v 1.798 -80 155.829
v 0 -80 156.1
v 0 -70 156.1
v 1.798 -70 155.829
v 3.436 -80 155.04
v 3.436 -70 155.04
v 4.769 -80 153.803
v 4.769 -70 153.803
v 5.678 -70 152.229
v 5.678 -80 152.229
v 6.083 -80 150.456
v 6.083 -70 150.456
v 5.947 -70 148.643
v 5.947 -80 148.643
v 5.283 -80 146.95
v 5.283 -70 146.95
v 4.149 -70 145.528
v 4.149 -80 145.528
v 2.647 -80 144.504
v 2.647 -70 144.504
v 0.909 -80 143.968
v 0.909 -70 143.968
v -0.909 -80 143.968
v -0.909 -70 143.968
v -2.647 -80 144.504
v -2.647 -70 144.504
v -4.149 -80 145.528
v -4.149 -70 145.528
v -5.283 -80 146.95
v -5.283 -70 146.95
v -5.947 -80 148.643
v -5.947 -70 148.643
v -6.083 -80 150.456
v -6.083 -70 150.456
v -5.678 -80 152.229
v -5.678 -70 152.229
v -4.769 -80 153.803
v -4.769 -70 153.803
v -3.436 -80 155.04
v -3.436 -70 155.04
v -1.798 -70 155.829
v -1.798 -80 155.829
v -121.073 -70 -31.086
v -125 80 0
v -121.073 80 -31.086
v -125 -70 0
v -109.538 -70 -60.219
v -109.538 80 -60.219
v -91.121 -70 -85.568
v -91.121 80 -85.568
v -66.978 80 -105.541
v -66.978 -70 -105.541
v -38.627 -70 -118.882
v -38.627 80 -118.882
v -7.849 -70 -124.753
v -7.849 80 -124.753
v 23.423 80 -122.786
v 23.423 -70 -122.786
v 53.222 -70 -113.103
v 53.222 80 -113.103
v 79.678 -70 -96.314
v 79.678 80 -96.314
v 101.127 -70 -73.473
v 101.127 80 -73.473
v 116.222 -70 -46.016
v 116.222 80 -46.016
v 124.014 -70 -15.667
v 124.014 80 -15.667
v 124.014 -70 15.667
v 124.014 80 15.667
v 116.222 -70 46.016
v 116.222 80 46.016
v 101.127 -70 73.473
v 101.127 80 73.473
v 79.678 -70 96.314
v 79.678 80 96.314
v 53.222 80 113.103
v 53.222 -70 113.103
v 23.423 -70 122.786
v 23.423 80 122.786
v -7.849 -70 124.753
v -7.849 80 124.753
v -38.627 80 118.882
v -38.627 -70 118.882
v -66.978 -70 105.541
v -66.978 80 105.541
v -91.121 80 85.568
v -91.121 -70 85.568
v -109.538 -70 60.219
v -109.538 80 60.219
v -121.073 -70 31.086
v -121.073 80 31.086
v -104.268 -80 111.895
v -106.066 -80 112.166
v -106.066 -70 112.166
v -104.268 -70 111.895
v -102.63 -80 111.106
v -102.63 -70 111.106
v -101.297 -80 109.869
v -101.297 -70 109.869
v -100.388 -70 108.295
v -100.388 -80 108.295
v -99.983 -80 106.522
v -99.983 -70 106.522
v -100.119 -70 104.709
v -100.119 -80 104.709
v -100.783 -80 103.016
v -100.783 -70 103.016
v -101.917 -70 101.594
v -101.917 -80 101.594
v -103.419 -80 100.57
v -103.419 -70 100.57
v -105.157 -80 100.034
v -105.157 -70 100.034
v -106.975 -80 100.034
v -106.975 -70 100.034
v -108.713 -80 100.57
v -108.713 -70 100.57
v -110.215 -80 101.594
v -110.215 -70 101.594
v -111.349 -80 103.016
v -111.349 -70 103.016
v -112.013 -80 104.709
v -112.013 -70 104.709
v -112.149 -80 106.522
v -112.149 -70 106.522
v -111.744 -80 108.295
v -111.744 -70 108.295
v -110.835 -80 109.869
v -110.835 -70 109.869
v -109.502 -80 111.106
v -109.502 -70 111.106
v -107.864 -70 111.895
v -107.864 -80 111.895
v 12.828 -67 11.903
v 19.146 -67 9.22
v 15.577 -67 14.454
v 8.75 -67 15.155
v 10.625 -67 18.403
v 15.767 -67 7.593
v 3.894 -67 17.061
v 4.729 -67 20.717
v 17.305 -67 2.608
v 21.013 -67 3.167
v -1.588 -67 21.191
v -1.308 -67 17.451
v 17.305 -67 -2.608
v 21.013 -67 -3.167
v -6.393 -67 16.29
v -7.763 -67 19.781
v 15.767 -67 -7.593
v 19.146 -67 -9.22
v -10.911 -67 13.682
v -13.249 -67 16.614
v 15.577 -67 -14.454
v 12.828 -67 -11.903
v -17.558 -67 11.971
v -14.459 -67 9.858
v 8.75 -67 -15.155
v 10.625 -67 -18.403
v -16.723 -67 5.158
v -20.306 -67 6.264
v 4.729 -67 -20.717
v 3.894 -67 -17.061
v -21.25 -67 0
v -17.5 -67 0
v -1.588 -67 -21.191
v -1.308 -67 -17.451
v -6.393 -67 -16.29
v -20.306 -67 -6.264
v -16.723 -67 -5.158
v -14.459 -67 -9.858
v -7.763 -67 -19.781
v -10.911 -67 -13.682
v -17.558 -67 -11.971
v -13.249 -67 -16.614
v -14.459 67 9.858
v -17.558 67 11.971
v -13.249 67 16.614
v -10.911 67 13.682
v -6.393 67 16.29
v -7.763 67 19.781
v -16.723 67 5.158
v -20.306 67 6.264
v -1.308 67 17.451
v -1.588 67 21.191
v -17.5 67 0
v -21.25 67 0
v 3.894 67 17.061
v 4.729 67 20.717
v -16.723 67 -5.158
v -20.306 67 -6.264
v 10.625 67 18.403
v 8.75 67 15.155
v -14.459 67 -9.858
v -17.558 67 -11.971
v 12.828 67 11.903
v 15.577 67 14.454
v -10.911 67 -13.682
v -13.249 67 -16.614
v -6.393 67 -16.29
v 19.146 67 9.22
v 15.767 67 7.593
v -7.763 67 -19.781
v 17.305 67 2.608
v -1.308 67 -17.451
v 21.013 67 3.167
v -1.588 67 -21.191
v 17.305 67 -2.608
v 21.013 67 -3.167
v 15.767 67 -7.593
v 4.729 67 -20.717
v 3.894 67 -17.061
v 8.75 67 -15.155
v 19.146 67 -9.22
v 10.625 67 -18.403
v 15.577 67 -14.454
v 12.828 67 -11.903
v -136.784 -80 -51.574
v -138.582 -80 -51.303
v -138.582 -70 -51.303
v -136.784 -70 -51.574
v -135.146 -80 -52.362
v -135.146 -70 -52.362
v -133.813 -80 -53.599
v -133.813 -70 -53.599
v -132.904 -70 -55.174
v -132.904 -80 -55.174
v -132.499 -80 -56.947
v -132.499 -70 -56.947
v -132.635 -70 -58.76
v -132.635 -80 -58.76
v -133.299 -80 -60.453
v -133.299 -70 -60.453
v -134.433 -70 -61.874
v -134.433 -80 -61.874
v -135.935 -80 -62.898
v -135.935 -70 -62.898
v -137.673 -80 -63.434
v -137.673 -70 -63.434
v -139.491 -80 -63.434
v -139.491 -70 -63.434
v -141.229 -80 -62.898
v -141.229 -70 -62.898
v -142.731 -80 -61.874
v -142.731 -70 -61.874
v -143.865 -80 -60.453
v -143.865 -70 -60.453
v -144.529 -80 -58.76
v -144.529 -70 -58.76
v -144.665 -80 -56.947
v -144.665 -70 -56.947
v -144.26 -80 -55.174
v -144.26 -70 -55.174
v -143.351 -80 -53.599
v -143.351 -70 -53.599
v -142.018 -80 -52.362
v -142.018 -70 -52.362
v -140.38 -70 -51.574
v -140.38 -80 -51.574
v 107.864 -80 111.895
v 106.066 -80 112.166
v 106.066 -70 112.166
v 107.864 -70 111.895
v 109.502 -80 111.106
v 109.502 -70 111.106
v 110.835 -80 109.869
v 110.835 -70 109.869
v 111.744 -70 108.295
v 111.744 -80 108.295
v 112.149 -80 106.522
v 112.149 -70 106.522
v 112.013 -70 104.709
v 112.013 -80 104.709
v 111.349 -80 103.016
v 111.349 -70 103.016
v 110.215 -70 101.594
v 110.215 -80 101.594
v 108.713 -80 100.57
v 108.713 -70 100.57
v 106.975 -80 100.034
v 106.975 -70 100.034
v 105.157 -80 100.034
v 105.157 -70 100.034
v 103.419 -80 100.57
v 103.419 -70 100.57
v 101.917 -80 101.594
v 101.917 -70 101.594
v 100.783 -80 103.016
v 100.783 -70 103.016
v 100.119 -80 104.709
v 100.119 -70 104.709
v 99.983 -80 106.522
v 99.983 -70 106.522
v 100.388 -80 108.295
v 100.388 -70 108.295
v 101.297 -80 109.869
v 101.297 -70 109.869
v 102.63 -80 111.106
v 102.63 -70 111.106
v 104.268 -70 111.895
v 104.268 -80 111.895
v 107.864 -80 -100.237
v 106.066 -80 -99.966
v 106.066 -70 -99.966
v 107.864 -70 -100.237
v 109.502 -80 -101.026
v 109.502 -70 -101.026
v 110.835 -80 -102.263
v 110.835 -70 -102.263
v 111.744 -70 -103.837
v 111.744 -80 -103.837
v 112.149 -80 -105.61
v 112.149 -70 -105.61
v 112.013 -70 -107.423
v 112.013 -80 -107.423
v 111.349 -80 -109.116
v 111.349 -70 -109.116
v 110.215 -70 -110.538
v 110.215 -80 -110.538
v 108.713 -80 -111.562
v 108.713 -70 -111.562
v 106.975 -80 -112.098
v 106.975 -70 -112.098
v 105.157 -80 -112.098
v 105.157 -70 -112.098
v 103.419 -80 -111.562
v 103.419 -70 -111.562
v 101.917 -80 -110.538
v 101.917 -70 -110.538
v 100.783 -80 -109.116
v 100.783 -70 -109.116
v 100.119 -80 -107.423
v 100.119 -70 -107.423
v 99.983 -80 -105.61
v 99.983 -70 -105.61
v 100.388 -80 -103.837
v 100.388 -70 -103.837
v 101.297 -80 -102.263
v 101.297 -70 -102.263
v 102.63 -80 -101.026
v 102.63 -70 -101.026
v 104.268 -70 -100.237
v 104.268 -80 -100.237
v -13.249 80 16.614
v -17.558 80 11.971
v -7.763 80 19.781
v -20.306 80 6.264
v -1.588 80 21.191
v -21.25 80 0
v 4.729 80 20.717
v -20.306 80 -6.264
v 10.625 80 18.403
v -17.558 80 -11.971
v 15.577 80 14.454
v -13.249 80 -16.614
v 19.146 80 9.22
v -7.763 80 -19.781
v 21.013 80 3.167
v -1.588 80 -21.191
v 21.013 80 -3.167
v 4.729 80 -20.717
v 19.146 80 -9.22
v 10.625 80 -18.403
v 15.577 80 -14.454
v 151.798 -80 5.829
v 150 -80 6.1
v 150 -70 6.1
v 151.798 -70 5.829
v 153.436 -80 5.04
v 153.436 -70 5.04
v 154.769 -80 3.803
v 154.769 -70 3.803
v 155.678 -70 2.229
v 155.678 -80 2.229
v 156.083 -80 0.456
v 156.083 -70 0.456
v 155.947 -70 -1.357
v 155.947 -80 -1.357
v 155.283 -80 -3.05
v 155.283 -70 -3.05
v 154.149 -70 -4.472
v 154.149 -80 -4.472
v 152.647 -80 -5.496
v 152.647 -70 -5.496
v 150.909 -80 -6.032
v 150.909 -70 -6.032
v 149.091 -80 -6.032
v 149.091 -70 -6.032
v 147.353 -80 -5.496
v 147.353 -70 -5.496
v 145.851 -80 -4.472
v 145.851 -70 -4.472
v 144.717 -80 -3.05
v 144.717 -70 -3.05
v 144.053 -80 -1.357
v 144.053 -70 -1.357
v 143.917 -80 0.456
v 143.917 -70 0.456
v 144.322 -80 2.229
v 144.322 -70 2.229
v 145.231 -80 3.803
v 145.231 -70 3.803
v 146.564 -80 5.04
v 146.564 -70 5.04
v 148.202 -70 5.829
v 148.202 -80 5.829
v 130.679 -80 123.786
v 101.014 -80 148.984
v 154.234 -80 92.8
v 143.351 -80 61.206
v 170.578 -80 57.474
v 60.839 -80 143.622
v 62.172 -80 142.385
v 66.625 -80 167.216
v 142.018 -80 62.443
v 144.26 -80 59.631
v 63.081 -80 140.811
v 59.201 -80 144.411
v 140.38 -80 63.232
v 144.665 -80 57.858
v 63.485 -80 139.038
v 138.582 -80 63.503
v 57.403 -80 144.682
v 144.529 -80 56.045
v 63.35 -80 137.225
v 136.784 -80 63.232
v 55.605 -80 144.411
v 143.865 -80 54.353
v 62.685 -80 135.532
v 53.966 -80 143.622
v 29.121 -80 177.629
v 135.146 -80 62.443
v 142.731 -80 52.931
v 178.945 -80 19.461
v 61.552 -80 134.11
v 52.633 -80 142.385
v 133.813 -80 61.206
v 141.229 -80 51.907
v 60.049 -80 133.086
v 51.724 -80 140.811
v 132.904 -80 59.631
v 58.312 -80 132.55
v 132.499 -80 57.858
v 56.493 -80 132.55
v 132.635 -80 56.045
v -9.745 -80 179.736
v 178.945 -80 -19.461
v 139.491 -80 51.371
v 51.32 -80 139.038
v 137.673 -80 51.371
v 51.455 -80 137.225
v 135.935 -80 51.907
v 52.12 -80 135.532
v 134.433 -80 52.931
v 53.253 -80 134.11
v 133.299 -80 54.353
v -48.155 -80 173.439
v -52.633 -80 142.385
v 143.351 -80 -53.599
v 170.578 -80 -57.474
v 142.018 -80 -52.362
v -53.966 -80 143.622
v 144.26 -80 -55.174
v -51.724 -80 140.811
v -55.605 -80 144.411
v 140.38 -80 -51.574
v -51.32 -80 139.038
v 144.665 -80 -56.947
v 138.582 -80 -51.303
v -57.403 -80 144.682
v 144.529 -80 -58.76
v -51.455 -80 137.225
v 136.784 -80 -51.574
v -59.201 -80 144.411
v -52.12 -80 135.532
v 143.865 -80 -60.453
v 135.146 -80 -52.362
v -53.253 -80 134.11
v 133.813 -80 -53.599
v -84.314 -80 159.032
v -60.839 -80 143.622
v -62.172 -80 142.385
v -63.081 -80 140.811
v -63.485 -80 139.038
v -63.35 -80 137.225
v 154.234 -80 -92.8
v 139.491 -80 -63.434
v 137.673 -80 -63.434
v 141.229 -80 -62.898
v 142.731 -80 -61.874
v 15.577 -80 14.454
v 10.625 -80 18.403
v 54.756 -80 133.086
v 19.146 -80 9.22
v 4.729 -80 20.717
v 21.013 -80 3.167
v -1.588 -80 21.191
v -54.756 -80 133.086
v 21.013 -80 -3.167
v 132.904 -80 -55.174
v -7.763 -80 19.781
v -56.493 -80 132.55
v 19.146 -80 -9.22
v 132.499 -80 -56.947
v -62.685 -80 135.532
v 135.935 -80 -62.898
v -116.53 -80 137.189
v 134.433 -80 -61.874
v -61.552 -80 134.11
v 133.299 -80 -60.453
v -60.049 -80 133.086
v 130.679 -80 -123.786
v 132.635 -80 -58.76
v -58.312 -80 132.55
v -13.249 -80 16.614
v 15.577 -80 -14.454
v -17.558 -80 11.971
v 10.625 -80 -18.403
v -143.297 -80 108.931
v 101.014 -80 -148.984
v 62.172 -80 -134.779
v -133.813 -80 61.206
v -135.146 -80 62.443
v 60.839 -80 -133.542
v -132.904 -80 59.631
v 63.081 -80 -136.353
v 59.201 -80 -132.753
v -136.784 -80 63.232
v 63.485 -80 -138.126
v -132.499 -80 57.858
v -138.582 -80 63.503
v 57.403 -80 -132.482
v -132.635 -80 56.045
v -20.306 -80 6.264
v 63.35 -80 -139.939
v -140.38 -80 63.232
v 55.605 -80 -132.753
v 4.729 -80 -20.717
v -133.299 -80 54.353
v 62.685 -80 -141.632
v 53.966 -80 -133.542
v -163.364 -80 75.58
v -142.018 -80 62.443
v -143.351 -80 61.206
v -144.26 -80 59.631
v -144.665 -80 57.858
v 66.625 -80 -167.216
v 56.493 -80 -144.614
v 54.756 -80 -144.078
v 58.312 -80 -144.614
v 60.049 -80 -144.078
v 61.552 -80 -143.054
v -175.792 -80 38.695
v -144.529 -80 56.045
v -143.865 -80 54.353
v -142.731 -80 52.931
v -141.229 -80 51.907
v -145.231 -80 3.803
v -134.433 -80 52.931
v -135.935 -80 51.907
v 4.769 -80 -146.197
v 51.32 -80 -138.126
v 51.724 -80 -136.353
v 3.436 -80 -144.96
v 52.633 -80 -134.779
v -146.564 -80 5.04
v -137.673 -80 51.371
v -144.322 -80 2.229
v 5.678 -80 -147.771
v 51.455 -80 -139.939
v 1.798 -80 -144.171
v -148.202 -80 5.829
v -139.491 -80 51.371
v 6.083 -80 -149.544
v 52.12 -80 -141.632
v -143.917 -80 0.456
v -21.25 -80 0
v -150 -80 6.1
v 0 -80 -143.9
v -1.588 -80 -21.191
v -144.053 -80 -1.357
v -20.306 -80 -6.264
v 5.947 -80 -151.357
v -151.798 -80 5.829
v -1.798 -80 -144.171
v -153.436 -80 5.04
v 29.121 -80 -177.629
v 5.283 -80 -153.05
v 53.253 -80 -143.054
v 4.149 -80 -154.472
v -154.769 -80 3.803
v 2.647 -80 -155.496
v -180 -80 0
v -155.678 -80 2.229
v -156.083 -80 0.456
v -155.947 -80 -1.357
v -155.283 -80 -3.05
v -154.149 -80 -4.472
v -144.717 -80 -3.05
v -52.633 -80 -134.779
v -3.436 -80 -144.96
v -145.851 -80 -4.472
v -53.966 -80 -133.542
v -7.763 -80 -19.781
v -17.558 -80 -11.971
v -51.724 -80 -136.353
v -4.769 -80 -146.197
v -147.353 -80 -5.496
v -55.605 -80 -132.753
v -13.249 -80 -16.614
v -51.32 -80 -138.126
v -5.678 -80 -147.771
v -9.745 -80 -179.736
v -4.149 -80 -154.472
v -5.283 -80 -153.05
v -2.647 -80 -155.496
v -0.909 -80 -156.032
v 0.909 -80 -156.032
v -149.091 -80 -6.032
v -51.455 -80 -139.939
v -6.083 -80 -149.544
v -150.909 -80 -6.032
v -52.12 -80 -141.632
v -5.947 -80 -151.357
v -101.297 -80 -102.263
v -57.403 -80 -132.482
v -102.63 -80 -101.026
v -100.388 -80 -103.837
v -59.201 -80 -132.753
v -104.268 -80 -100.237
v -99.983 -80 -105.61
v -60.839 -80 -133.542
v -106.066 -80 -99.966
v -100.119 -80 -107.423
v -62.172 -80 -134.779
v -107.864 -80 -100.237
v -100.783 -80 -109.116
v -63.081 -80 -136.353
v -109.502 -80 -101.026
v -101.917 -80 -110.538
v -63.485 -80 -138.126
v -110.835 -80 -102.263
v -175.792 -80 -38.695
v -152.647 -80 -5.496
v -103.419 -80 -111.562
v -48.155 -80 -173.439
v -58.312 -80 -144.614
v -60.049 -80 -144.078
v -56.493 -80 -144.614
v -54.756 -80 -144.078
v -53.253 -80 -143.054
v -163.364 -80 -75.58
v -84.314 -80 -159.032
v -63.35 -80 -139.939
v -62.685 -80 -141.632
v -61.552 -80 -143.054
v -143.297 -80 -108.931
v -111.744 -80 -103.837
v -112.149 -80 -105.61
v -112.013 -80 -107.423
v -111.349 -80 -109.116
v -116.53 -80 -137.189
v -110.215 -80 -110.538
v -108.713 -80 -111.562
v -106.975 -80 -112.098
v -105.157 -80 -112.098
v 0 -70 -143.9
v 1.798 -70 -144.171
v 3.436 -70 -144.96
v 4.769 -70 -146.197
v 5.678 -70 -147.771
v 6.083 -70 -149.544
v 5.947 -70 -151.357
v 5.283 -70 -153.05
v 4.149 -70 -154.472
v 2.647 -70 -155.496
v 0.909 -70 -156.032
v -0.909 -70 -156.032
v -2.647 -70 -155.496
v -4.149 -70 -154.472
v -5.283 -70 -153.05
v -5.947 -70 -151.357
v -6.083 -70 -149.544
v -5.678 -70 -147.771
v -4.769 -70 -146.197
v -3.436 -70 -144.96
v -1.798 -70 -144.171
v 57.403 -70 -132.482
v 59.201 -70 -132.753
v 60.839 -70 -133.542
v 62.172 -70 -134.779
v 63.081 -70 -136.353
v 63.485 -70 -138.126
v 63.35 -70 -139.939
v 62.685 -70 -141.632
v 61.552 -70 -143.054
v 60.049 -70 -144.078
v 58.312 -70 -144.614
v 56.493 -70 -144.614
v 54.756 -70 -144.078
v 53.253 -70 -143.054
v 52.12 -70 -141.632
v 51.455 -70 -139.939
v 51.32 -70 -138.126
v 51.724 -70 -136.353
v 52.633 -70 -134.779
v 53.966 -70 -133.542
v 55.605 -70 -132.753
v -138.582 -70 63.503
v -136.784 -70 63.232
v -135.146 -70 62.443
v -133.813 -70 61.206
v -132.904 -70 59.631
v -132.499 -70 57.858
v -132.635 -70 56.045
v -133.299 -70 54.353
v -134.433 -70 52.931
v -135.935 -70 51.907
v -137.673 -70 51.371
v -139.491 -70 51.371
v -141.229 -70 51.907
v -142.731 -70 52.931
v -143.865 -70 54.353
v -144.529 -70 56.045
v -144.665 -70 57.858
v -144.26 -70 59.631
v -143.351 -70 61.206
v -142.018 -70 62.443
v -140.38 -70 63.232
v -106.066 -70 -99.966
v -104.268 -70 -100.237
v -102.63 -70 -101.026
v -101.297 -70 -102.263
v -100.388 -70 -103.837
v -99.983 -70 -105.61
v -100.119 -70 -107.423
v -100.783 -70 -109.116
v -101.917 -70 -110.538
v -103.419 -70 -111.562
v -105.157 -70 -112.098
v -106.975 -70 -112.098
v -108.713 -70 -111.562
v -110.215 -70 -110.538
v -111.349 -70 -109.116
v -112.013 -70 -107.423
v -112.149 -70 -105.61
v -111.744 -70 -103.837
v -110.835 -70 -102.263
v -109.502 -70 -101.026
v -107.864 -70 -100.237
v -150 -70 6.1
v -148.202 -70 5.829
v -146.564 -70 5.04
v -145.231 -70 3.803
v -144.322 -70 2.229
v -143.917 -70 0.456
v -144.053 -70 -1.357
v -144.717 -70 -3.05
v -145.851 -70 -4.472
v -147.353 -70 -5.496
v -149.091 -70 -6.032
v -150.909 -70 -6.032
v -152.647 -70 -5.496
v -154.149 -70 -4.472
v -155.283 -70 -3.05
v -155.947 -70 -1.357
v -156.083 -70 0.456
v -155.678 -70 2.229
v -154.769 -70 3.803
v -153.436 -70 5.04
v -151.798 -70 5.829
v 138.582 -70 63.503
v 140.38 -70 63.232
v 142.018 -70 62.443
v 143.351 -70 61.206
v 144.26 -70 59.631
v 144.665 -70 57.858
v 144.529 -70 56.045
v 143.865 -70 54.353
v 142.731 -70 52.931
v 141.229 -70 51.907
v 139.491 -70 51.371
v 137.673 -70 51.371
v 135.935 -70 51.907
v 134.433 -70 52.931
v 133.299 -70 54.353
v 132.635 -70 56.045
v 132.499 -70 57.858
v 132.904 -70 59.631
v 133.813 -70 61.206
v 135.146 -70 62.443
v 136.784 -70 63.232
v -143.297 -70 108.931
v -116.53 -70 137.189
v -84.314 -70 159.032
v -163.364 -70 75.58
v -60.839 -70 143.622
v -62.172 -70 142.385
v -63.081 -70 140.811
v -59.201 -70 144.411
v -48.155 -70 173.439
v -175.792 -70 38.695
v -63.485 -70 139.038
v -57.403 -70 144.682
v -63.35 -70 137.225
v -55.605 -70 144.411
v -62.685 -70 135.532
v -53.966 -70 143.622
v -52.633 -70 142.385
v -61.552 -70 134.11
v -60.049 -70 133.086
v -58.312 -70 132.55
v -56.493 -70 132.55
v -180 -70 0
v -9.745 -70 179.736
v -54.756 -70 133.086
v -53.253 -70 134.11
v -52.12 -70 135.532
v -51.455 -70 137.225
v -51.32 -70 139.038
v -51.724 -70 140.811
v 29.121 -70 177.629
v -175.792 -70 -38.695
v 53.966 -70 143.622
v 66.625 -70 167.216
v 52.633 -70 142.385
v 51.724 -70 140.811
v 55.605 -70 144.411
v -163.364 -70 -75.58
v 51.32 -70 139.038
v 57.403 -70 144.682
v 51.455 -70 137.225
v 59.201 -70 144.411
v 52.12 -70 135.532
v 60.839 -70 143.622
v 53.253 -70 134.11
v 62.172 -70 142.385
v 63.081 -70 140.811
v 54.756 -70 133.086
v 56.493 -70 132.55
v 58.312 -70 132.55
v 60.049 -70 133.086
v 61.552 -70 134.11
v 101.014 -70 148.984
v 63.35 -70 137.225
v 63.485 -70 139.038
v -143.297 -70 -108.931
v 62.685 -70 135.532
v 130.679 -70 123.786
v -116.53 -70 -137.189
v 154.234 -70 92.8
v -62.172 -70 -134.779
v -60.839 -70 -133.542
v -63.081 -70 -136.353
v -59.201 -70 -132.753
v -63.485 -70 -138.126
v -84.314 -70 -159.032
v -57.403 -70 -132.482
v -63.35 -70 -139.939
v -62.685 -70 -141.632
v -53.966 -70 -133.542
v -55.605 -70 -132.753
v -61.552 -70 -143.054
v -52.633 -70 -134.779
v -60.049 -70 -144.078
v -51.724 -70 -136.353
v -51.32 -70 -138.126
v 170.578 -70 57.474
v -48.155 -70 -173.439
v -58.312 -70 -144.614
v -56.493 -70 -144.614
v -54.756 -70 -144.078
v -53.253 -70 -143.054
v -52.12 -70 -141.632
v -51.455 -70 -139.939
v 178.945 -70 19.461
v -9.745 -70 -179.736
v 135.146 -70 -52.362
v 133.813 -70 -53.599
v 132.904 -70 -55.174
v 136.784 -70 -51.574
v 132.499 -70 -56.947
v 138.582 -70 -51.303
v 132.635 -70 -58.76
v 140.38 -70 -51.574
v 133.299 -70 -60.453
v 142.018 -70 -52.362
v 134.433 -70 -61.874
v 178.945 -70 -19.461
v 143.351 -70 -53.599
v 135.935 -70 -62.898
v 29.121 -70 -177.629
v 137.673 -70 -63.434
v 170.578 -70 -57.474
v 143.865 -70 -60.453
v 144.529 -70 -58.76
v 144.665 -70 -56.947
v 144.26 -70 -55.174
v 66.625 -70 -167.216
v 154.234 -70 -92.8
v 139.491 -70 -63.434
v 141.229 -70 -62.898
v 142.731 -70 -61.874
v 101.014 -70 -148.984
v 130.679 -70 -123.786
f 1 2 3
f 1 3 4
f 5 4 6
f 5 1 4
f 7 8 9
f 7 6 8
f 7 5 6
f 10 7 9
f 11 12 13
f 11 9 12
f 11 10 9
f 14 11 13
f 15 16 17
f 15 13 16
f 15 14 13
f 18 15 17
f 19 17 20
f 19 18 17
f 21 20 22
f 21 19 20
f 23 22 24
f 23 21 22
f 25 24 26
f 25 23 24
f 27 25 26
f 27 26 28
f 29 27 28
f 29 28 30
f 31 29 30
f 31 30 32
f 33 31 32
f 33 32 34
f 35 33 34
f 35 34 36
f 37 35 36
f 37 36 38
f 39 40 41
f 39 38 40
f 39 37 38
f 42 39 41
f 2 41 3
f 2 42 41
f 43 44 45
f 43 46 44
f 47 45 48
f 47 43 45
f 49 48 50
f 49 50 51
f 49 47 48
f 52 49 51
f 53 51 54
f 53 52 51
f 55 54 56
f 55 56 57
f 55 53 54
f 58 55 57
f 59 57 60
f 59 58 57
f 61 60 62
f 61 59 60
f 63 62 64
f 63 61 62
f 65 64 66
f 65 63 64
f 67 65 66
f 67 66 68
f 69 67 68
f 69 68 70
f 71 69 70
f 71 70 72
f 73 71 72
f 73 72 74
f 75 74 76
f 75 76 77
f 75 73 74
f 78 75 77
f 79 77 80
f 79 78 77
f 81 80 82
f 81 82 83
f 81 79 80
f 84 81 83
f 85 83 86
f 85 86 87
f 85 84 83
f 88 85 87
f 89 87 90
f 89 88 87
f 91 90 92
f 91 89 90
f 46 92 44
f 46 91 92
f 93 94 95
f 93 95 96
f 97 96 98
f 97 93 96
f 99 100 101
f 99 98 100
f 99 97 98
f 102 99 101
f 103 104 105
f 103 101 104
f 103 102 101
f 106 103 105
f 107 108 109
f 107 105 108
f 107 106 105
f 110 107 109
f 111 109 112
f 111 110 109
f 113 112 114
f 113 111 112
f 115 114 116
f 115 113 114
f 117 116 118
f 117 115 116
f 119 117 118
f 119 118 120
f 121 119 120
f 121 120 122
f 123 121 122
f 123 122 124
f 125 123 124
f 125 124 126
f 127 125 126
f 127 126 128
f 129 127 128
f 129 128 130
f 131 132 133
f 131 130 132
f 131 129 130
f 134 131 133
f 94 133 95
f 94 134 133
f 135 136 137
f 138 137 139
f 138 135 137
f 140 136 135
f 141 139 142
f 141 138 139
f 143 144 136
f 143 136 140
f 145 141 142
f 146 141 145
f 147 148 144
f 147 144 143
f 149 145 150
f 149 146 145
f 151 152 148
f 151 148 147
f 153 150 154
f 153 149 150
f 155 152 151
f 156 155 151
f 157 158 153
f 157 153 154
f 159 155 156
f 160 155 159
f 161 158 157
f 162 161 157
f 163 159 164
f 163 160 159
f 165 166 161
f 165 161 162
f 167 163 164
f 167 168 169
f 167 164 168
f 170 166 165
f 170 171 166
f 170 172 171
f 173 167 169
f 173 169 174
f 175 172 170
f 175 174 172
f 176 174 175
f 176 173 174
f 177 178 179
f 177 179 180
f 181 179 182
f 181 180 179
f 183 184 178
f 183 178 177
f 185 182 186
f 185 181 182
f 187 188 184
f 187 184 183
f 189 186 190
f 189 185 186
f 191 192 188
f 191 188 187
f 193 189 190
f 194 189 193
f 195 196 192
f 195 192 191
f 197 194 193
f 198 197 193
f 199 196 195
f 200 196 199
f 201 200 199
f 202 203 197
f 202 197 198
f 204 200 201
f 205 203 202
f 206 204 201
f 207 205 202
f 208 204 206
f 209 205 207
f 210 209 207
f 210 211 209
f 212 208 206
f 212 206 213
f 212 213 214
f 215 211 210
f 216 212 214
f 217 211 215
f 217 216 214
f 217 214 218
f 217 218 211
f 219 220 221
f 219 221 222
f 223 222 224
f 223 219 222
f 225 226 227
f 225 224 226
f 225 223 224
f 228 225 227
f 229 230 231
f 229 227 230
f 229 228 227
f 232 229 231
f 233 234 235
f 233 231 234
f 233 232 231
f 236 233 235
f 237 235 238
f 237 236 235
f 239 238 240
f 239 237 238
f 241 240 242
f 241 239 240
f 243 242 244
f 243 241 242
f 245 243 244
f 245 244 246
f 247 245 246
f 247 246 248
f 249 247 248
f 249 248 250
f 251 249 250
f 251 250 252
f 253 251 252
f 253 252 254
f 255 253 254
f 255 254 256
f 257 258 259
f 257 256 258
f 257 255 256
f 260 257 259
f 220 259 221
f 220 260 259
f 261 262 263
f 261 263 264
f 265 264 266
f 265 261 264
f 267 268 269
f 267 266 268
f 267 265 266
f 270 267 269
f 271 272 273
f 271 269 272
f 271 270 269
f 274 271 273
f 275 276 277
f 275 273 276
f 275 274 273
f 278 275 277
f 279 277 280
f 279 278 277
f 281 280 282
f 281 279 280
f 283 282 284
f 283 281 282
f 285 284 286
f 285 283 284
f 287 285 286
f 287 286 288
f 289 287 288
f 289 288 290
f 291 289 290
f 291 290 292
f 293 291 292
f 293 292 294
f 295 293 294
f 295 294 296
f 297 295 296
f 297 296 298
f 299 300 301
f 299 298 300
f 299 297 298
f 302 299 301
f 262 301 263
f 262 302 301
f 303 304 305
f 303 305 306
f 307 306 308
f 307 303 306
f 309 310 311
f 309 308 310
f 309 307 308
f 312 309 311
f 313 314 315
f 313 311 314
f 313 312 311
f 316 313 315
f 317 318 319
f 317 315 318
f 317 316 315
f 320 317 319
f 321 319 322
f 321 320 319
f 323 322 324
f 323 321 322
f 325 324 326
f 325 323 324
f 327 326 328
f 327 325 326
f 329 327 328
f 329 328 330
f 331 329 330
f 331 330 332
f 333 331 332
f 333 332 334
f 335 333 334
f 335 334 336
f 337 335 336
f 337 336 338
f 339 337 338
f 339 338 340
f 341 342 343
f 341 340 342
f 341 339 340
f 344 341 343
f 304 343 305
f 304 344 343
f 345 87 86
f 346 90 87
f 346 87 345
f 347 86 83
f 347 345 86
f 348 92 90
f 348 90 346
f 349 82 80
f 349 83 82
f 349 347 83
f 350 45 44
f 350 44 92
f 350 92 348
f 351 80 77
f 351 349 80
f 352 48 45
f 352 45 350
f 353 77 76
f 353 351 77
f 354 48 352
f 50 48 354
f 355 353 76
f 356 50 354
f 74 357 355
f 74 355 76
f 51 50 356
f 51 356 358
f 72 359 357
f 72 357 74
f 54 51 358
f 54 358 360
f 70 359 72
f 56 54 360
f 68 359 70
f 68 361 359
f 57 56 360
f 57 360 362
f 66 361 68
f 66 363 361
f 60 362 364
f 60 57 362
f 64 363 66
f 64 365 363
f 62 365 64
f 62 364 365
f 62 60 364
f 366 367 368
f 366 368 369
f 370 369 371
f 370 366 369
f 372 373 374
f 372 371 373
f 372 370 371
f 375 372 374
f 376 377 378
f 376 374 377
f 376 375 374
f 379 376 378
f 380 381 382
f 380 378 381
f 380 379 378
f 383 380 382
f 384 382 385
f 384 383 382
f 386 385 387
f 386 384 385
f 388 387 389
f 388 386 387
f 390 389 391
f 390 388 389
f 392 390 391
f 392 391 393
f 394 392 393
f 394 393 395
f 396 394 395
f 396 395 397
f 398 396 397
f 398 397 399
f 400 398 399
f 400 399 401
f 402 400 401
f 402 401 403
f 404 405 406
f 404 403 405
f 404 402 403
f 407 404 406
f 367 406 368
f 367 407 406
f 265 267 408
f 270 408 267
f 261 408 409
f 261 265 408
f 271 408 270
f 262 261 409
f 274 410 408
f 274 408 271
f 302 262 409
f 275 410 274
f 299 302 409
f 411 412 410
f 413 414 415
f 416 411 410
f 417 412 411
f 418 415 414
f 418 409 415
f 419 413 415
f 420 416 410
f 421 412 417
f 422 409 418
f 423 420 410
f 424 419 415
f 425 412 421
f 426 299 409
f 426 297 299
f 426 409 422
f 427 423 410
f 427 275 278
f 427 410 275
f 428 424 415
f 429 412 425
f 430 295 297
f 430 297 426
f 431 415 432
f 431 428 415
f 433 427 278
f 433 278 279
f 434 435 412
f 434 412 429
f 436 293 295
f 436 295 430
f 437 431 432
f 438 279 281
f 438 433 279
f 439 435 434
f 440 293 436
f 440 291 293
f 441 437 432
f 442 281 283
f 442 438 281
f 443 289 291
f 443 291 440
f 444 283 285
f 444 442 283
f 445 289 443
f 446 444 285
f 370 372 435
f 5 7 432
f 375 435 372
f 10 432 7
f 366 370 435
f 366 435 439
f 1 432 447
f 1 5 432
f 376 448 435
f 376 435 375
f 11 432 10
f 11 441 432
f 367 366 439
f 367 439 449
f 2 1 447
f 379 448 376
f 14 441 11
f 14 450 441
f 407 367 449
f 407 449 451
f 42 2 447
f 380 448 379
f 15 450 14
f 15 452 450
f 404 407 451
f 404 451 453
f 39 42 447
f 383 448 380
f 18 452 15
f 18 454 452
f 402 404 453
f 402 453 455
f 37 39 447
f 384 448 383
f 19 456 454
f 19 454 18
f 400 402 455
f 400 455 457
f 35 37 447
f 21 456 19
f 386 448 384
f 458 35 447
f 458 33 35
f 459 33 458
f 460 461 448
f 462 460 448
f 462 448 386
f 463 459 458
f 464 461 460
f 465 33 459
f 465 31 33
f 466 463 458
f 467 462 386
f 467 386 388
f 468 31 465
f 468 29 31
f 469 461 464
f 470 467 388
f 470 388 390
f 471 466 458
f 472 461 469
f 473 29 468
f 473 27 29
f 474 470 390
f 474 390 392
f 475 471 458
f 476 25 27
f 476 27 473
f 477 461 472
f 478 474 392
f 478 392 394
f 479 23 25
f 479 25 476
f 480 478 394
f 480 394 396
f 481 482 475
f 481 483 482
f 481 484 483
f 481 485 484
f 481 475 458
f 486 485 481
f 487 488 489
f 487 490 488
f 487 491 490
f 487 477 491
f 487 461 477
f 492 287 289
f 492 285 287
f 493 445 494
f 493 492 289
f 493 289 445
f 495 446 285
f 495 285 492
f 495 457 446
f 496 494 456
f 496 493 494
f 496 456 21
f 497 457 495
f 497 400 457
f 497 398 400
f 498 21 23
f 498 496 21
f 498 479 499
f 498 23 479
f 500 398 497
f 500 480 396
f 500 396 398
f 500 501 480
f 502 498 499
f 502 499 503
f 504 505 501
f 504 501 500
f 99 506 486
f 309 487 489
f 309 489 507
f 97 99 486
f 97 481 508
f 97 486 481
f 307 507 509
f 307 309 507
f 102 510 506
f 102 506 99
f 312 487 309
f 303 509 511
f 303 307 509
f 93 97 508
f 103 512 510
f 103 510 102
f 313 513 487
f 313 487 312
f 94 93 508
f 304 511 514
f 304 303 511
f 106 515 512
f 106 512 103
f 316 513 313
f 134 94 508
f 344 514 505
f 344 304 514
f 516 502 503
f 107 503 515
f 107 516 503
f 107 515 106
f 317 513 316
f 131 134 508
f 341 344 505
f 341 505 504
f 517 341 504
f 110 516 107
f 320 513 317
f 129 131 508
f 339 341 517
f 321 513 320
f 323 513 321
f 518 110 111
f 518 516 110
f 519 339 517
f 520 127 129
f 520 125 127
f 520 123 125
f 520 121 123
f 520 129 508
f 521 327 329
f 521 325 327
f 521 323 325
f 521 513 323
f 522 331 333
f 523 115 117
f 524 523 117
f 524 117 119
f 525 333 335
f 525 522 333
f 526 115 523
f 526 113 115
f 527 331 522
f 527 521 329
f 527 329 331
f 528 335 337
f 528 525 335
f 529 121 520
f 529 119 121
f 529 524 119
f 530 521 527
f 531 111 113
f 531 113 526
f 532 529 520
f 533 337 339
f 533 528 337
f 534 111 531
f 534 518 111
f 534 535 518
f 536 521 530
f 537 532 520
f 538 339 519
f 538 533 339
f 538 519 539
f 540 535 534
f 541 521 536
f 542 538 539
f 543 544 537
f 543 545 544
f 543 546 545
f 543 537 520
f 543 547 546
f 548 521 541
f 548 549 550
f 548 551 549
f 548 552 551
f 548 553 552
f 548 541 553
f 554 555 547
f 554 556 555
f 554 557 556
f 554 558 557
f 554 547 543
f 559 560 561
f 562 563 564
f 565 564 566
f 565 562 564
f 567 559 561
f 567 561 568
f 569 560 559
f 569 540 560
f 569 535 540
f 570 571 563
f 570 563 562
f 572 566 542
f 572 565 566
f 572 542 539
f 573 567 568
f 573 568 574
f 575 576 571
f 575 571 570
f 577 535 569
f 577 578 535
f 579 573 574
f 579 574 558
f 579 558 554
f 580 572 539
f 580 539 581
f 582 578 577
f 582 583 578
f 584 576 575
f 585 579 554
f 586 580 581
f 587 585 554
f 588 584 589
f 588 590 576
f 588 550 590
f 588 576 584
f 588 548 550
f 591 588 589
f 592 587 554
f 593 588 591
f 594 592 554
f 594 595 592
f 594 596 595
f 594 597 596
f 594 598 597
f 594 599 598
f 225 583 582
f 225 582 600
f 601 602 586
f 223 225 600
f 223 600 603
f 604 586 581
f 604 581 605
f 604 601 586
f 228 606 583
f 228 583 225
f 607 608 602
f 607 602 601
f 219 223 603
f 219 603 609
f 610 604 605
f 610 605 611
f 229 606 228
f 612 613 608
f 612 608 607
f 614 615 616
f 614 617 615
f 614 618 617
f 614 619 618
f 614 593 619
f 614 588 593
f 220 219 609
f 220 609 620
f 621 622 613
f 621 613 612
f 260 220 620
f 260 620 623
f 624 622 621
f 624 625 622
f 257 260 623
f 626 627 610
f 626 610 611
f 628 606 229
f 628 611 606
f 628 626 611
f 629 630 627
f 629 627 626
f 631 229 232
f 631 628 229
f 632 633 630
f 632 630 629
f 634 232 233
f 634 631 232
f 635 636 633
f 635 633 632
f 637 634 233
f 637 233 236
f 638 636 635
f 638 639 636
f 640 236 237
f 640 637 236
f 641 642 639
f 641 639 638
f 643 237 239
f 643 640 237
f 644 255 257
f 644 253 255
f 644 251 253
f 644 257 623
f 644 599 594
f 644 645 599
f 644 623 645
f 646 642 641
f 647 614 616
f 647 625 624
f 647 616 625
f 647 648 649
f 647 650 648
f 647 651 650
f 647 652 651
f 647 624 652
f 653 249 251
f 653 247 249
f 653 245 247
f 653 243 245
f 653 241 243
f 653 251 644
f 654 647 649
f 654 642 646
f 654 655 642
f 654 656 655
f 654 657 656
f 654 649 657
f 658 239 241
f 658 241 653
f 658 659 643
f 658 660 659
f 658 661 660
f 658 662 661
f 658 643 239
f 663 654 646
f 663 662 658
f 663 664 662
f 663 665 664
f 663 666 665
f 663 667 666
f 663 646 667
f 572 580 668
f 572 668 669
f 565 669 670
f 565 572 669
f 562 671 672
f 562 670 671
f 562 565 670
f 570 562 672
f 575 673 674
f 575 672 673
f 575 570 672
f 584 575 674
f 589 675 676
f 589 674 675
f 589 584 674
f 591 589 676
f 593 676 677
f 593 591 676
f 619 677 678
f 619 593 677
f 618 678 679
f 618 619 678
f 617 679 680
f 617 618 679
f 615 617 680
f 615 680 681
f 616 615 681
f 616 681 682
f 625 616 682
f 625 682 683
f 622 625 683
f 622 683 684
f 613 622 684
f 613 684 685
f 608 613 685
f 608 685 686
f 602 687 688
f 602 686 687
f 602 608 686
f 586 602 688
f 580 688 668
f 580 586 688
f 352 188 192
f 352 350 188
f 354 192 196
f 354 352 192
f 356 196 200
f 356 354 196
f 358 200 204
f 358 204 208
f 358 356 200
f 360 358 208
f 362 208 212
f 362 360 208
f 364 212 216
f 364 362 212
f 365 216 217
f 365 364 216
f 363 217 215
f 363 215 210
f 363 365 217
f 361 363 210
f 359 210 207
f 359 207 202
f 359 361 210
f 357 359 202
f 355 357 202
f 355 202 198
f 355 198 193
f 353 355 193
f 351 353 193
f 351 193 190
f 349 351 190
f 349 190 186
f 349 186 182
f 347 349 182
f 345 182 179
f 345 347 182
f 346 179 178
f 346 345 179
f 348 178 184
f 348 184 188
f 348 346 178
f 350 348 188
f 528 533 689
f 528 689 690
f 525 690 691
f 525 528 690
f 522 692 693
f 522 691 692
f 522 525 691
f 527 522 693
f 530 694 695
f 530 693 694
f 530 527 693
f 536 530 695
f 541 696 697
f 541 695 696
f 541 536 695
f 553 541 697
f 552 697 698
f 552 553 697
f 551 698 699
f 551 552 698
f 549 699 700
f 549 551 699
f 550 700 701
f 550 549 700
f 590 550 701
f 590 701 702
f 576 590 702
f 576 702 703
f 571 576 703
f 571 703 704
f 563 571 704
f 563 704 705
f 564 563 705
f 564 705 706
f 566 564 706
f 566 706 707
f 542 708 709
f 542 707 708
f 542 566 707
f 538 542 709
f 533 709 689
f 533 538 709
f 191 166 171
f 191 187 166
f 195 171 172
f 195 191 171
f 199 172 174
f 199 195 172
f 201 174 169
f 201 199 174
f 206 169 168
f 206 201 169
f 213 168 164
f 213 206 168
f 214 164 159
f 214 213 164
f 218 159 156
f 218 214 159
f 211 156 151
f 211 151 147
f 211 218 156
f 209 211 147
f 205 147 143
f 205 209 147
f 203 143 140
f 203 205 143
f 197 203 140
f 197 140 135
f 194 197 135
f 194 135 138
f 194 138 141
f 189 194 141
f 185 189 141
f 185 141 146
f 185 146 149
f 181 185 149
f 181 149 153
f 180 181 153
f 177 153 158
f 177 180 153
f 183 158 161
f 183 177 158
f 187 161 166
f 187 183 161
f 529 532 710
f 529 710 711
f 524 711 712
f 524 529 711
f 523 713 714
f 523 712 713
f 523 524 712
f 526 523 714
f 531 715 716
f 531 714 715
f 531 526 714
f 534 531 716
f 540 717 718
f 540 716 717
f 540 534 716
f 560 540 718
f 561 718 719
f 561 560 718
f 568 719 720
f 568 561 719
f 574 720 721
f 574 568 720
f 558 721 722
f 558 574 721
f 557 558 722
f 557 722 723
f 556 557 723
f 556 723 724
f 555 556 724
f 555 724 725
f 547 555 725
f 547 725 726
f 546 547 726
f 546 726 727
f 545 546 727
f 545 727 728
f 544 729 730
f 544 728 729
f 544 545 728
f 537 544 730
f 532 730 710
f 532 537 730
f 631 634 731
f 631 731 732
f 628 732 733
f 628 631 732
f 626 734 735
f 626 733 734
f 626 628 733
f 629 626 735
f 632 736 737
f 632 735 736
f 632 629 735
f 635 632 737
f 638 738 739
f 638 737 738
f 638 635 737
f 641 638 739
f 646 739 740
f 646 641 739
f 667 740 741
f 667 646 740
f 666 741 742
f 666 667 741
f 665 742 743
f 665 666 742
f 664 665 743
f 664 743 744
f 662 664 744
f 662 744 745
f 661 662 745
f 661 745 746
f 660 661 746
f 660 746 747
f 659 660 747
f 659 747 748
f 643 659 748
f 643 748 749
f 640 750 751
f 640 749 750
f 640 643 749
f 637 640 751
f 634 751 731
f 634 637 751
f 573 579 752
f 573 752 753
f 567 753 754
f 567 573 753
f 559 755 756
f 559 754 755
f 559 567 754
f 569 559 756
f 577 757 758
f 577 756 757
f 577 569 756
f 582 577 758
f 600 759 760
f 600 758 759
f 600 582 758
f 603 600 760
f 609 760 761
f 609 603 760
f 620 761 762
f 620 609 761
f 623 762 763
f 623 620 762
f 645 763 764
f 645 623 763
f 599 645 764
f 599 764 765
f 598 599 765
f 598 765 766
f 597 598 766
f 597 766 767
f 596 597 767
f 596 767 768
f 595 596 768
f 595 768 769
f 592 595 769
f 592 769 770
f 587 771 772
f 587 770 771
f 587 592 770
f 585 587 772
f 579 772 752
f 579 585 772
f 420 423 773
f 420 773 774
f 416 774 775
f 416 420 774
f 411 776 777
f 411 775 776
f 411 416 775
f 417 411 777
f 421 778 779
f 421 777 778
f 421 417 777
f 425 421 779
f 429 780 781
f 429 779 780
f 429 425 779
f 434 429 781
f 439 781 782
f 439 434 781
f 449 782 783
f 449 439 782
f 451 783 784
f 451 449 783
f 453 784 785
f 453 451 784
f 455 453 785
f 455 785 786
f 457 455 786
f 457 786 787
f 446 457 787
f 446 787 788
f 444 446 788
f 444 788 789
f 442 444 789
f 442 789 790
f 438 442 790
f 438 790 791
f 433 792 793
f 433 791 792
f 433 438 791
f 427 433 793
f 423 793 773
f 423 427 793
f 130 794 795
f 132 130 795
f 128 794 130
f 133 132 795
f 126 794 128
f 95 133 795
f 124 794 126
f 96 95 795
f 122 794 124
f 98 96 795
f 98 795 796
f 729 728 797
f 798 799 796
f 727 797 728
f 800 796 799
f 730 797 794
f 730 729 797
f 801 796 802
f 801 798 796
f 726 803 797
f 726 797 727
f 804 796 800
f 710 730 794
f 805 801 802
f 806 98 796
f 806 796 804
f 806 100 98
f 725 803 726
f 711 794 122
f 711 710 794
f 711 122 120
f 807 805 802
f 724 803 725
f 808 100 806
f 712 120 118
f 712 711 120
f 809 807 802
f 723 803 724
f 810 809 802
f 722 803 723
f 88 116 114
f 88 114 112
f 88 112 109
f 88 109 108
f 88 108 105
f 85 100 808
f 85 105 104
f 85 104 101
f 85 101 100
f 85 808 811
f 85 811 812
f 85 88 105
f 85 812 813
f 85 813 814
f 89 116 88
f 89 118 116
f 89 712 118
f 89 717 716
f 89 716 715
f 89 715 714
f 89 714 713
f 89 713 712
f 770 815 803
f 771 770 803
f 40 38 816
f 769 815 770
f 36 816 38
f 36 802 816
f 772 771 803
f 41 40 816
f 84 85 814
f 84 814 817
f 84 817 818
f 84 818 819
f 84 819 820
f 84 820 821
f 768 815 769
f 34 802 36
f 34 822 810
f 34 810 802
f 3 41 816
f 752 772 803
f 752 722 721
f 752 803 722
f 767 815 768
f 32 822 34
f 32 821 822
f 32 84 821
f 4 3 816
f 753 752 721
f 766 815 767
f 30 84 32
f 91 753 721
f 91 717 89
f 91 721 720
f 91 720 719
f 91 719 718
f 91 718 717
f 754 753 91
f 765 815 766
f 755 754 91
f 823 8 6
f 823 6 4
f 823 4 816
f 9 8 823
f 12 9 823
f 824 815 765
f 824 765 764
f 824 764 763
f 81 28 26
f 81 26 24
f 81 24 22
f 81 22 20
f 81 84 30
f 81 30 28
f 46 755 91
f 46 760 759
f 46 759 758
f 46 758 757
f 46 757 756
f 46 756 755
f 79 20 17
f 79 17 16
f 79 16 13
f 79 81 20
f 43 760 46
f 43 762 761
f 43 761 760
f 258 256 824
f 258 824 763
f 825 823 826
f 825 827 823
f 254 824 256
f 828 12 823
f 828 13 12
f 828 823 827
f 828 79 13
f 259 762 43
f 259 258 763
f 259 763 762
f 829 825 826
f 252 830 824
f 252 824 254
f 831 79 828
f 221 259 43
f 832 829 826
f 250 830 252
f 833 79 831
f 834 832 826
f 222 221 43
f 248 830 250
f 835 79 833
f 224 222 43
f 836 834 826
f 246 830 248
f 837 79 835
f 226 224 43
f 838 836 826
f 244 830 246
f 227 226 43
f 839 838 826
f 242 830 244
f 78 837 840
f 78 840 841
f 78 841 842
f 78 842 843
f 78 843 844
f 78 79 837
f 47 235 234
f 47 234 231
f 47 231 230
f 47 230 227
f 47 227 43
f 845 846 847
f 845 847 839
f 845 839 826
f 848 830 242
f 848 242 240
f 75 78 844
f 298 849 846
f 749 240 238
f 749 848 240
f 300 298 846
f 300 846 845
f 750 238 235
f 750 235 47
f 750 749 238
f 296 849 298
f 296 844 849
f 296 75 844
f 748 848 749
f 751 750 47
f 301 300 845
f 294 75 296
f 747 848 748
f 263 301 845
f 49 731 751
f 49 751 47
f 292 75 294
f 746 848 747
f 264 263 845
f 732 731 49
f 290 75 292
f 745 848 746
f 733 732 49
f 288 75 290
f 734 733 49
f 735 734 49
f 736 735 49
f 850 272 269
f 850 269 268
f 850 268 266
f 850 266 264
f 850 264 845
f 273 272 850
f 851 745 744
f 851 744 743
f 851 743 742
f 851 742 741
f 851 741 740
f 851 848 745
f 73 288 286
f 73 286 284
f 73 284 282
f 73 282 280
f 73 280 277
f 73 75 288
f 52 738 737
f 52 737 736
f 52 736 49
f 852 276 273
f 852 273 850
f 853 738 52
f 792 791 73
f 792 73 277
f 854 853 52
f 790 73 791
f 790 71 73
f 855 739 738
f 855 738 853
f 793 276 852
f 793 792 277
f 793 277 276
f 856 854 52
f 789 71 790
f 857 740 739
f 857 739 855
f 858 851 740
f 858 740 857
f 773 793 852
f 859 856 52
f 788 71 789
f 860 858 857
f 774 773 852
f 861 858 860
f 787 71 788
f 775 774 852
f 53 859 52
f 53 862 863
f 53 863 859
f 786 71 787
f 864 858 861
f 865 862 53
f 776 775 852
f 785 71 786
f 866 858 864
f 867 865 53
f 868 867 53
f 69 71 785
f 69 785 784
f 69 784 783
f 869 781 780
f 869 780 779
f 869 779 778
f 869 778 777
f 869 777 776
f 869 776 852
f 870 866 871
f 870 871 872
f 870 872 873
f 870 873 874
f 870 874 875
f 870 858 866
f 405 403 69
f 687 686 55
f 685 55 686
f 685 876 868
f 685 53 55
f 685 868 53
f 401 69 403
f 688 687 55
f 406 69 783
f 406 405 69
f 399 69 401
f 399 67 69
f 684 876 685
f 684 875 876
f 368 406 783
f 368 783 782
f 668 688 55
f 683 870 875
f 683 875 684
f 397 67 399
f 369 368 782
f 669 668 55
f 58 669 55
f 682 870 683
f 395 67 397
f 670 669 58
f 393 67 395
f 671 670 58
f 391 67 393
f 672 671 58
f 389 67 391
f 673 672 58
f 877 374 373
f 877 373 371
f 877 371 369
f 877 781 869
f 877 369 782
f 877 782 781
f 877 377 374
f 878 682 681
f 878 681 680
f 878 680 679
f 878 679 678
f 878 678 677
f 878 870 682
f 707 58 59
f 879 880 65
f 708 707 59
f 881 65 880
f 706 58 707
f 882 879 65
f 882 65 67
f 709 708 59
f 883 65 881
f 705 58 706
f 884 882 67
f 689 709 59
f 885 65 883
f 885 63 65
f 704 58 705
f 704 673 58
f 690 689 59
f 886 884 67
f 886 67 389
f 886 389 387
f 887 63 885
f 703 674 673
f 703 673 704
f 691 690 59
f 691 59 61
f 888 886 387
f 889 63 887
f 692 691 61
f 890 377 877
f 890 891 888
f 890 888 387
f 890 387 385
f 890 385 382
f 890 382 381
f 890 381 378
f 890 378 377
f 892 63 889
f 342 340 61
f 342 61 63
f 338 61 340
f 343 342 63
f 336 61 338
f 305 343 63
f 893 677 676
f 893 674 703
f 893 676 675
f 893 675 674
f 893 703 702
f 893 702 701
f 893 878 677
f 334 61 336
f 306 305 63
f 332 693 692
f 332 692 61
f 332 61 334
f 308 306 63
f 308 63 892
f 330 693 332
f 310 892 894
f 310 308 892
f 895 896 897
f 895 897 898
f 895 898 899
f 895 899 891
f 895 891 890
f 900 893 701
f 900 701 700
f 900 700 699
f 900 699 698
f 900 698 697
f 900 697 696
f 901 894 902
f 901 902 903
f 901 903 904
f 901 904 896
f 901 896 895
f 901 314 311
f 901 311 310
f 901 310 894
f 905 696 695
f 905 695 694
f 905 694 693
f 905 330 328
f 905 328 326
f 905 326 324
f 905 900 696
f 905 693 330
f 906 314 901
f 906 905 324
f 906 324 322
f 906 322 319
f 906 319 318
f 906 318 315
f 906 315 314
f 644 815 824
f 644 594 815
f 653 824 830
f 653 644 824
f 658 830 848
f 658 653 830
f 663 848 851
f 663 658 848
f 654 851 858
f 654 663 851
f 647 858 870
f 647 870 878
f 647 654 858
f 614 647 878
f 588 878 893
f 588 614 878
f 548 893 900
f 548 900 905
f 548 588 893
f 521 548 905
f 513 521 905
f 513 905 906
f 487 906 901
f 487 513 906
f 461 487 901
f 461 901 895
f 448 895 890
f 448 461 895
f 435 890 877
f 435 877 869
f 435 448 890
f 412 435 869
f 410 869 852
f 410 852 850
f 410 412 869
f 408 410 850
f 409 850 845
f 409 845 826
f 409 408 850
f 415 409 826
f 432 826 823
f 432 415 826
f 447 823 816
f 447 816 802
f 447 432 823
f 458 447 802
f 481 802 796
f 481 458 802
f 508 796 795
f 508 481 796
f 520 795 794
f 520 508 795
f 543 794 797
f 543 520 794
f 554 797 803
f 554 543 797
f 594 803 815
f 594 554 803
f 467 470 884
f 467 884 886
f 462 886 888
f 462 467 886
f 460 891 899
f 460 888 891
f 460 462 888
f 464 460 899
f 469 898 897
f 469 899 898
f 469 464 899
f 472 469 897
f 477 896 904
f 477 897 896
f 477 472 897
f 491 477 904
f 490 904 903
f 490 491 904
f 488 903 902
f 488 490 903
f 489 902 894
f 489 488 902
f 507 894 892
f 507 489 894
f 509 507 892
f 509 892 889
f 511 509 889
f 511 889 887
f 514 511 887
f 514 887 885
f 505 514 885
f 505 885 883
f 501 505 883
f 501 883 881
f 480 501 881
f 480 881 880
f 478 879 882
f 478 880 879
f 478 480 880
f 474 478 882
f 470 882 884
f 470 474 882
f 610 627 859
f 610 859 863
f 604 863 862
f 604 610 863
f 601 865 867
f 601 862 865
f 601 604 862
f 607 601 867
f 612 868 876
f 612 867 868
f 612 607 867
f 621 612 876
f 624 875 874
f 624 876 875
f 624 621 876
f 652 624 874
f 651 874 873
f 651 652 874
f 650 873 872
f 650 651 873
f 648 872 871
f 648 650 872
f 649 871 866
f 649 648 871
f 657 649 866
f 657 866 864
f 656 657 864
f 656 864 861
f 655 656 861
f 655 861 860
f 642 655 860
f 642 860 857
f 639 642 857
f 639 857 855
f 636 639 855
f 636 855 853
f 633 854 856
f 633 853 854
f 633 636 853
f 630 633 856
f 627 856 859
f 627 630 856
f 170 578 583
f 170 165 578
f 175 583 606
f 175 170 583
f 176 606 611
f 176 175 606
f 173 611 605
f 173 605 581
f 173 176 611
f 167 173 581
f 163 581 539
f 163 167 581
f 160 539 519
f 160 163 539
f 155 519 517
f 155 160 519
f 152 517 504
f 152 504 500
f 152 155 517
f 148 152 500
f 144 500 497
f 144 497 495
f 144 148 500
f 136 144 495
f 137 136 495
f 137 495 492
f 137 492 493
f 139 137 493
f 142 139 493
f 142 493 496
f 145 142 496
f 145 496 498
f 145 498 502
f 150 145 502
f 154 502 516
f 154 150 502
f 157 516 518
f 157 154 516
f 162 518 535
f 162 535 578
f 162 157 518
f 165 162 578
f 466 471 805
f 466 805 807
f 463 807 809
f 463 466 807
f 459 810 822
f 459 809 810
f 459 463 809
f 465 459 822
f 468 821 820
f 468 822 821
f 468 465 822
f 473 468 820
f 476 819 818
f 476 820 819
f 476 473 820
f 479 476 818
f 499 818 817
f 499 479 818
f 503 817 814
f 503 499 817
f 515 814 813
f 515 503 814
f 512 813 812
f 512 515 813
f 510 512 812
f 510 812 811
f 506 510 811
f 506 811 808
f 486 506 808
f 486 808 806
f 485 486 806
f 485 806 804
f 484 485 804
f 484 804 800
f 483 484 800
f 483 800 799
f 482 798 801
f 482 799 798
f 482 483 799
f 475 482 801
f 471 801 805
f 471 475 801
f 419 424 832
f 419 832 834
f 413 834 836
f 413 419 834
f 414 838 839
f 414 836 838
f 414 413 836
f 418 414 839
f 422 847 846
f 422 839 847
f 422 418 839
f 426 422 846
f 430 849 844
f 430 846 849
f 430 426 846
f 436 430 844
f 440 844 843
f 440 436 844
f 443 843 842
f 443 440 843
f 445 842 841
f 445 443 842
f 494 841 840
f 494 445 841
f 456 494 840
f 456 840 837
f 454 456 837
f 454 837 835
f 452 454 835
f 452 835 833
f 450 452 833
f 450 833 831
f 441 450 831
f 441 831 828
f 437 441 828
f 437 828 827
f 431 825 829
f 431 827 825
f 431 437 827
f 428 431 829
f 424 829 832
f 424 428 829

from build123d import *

# Parameters (mm, degrees)
CUT_EXTRUDE1_DEPTH      = 296.465734054
CUT_EXTRUDE1_DEPTH_BACK = 296.465734054
SKETCH2_R               = 6.1


with BuildPart() as part:
    # Sketch1 → Revolve1 (revolve)
    with BuildSketch(Plane.XY):
        Polygon((-21.25, -80), (-21.25, -67), (-17.5, -67), (-17.5, 67), (-21.25, 67), (-21.25, 80), (-42.5, 80), (-125, 80), (-125, 70), (-125, -70), (-180, -70), (-180, -80), (-42.5, -80), align=None)
    revolve(axis=Axis((0, 80, 0), (0, -1, 0)))

    # Sketch2 → Cut-Extrude1 (cut, two sides: drawn at the far end of the back side and taken through both)
    with BuildSketch(Plane(origin=(0, -70, 0), x_dir=(1, 0, 0), z_dir=(0, 1, 0)).offset(-CUT_EXTRUDE1_DEPTH_BACK)):
        with Locations(Location((0, 150, 0), (0, 0, 270))):
            Circle(SKETCH2_R)
        with Locations(Location((57.402514855, 138.581929877, 0), (0, 0, 270))):
            Circle(SKETCH2_R)
        with Locations(Location((106.066017178, 106.066017178, 0), (0, 0, 270))):
            Circle(SKETCH2_R)
        with Locations(Location((138.581929877, 57.402514855, 0), (0, 0, 270))):
            Circle(SKETCH2_R)
        with Locations(Location((150, 0, 0), (0, 0, 270))):
            Circle(SKETCH2_R)
        with Locations(Location((138.581929877, -57.402514855, 0), (0, 0, 270))):
            Circle(SKETCH2_R)
        with Locations(Location((106.066017178, -106.066017178, 0), (0, 0, 270))):
            Circle(SKETCH2_R)
        with Locations(Location((57.402514855, -138.581929877, 0), (0, 0, 270))):
            Circle(SKETCH2_R)
        with Locations(Location((0, -150, 0), (0, 0, 270))):
            Circle(SKETCH2_R)
        with Locations(Location((-57.402514855, -138.581929877, 0), (0, 0, 270))):
            Circle(SKETCH2_R)
        with Locations(Location((-106.066017178, -106.066017178, 0), (0, 0, 270))):
            Circle(SKETCH2_R)
        with Locations(Location((-138.581929877, -57.402514855, 0), (0, 0, 270))):
            Circle(SKETCH2_R)
        with Locations(Location((-150, 0, 0), (0, 0, 270))):
            Circle(SKETCH2_R)
        with Locations(Location((-138.581929877, 57.402514855, 0), (0, 0, 270))):
            Circle(SKETCH2_R)
        with Locations(Location((-106.066017178, 106.066017178, 0), (0, 0, 270))):
            Circle(SKETCH2_R)
        with Locations(Location((-57.402514855, 138.581929877, 0), (0, 0, 270))):
            Circle(SKETCH2_R)
    extrude(amount=CUT_EXTRUDE1_DEPTH + CUT_EXTRUDE1_DEPTH_BACK, mode=Mode.SUBTRACT)


solid = part.part
